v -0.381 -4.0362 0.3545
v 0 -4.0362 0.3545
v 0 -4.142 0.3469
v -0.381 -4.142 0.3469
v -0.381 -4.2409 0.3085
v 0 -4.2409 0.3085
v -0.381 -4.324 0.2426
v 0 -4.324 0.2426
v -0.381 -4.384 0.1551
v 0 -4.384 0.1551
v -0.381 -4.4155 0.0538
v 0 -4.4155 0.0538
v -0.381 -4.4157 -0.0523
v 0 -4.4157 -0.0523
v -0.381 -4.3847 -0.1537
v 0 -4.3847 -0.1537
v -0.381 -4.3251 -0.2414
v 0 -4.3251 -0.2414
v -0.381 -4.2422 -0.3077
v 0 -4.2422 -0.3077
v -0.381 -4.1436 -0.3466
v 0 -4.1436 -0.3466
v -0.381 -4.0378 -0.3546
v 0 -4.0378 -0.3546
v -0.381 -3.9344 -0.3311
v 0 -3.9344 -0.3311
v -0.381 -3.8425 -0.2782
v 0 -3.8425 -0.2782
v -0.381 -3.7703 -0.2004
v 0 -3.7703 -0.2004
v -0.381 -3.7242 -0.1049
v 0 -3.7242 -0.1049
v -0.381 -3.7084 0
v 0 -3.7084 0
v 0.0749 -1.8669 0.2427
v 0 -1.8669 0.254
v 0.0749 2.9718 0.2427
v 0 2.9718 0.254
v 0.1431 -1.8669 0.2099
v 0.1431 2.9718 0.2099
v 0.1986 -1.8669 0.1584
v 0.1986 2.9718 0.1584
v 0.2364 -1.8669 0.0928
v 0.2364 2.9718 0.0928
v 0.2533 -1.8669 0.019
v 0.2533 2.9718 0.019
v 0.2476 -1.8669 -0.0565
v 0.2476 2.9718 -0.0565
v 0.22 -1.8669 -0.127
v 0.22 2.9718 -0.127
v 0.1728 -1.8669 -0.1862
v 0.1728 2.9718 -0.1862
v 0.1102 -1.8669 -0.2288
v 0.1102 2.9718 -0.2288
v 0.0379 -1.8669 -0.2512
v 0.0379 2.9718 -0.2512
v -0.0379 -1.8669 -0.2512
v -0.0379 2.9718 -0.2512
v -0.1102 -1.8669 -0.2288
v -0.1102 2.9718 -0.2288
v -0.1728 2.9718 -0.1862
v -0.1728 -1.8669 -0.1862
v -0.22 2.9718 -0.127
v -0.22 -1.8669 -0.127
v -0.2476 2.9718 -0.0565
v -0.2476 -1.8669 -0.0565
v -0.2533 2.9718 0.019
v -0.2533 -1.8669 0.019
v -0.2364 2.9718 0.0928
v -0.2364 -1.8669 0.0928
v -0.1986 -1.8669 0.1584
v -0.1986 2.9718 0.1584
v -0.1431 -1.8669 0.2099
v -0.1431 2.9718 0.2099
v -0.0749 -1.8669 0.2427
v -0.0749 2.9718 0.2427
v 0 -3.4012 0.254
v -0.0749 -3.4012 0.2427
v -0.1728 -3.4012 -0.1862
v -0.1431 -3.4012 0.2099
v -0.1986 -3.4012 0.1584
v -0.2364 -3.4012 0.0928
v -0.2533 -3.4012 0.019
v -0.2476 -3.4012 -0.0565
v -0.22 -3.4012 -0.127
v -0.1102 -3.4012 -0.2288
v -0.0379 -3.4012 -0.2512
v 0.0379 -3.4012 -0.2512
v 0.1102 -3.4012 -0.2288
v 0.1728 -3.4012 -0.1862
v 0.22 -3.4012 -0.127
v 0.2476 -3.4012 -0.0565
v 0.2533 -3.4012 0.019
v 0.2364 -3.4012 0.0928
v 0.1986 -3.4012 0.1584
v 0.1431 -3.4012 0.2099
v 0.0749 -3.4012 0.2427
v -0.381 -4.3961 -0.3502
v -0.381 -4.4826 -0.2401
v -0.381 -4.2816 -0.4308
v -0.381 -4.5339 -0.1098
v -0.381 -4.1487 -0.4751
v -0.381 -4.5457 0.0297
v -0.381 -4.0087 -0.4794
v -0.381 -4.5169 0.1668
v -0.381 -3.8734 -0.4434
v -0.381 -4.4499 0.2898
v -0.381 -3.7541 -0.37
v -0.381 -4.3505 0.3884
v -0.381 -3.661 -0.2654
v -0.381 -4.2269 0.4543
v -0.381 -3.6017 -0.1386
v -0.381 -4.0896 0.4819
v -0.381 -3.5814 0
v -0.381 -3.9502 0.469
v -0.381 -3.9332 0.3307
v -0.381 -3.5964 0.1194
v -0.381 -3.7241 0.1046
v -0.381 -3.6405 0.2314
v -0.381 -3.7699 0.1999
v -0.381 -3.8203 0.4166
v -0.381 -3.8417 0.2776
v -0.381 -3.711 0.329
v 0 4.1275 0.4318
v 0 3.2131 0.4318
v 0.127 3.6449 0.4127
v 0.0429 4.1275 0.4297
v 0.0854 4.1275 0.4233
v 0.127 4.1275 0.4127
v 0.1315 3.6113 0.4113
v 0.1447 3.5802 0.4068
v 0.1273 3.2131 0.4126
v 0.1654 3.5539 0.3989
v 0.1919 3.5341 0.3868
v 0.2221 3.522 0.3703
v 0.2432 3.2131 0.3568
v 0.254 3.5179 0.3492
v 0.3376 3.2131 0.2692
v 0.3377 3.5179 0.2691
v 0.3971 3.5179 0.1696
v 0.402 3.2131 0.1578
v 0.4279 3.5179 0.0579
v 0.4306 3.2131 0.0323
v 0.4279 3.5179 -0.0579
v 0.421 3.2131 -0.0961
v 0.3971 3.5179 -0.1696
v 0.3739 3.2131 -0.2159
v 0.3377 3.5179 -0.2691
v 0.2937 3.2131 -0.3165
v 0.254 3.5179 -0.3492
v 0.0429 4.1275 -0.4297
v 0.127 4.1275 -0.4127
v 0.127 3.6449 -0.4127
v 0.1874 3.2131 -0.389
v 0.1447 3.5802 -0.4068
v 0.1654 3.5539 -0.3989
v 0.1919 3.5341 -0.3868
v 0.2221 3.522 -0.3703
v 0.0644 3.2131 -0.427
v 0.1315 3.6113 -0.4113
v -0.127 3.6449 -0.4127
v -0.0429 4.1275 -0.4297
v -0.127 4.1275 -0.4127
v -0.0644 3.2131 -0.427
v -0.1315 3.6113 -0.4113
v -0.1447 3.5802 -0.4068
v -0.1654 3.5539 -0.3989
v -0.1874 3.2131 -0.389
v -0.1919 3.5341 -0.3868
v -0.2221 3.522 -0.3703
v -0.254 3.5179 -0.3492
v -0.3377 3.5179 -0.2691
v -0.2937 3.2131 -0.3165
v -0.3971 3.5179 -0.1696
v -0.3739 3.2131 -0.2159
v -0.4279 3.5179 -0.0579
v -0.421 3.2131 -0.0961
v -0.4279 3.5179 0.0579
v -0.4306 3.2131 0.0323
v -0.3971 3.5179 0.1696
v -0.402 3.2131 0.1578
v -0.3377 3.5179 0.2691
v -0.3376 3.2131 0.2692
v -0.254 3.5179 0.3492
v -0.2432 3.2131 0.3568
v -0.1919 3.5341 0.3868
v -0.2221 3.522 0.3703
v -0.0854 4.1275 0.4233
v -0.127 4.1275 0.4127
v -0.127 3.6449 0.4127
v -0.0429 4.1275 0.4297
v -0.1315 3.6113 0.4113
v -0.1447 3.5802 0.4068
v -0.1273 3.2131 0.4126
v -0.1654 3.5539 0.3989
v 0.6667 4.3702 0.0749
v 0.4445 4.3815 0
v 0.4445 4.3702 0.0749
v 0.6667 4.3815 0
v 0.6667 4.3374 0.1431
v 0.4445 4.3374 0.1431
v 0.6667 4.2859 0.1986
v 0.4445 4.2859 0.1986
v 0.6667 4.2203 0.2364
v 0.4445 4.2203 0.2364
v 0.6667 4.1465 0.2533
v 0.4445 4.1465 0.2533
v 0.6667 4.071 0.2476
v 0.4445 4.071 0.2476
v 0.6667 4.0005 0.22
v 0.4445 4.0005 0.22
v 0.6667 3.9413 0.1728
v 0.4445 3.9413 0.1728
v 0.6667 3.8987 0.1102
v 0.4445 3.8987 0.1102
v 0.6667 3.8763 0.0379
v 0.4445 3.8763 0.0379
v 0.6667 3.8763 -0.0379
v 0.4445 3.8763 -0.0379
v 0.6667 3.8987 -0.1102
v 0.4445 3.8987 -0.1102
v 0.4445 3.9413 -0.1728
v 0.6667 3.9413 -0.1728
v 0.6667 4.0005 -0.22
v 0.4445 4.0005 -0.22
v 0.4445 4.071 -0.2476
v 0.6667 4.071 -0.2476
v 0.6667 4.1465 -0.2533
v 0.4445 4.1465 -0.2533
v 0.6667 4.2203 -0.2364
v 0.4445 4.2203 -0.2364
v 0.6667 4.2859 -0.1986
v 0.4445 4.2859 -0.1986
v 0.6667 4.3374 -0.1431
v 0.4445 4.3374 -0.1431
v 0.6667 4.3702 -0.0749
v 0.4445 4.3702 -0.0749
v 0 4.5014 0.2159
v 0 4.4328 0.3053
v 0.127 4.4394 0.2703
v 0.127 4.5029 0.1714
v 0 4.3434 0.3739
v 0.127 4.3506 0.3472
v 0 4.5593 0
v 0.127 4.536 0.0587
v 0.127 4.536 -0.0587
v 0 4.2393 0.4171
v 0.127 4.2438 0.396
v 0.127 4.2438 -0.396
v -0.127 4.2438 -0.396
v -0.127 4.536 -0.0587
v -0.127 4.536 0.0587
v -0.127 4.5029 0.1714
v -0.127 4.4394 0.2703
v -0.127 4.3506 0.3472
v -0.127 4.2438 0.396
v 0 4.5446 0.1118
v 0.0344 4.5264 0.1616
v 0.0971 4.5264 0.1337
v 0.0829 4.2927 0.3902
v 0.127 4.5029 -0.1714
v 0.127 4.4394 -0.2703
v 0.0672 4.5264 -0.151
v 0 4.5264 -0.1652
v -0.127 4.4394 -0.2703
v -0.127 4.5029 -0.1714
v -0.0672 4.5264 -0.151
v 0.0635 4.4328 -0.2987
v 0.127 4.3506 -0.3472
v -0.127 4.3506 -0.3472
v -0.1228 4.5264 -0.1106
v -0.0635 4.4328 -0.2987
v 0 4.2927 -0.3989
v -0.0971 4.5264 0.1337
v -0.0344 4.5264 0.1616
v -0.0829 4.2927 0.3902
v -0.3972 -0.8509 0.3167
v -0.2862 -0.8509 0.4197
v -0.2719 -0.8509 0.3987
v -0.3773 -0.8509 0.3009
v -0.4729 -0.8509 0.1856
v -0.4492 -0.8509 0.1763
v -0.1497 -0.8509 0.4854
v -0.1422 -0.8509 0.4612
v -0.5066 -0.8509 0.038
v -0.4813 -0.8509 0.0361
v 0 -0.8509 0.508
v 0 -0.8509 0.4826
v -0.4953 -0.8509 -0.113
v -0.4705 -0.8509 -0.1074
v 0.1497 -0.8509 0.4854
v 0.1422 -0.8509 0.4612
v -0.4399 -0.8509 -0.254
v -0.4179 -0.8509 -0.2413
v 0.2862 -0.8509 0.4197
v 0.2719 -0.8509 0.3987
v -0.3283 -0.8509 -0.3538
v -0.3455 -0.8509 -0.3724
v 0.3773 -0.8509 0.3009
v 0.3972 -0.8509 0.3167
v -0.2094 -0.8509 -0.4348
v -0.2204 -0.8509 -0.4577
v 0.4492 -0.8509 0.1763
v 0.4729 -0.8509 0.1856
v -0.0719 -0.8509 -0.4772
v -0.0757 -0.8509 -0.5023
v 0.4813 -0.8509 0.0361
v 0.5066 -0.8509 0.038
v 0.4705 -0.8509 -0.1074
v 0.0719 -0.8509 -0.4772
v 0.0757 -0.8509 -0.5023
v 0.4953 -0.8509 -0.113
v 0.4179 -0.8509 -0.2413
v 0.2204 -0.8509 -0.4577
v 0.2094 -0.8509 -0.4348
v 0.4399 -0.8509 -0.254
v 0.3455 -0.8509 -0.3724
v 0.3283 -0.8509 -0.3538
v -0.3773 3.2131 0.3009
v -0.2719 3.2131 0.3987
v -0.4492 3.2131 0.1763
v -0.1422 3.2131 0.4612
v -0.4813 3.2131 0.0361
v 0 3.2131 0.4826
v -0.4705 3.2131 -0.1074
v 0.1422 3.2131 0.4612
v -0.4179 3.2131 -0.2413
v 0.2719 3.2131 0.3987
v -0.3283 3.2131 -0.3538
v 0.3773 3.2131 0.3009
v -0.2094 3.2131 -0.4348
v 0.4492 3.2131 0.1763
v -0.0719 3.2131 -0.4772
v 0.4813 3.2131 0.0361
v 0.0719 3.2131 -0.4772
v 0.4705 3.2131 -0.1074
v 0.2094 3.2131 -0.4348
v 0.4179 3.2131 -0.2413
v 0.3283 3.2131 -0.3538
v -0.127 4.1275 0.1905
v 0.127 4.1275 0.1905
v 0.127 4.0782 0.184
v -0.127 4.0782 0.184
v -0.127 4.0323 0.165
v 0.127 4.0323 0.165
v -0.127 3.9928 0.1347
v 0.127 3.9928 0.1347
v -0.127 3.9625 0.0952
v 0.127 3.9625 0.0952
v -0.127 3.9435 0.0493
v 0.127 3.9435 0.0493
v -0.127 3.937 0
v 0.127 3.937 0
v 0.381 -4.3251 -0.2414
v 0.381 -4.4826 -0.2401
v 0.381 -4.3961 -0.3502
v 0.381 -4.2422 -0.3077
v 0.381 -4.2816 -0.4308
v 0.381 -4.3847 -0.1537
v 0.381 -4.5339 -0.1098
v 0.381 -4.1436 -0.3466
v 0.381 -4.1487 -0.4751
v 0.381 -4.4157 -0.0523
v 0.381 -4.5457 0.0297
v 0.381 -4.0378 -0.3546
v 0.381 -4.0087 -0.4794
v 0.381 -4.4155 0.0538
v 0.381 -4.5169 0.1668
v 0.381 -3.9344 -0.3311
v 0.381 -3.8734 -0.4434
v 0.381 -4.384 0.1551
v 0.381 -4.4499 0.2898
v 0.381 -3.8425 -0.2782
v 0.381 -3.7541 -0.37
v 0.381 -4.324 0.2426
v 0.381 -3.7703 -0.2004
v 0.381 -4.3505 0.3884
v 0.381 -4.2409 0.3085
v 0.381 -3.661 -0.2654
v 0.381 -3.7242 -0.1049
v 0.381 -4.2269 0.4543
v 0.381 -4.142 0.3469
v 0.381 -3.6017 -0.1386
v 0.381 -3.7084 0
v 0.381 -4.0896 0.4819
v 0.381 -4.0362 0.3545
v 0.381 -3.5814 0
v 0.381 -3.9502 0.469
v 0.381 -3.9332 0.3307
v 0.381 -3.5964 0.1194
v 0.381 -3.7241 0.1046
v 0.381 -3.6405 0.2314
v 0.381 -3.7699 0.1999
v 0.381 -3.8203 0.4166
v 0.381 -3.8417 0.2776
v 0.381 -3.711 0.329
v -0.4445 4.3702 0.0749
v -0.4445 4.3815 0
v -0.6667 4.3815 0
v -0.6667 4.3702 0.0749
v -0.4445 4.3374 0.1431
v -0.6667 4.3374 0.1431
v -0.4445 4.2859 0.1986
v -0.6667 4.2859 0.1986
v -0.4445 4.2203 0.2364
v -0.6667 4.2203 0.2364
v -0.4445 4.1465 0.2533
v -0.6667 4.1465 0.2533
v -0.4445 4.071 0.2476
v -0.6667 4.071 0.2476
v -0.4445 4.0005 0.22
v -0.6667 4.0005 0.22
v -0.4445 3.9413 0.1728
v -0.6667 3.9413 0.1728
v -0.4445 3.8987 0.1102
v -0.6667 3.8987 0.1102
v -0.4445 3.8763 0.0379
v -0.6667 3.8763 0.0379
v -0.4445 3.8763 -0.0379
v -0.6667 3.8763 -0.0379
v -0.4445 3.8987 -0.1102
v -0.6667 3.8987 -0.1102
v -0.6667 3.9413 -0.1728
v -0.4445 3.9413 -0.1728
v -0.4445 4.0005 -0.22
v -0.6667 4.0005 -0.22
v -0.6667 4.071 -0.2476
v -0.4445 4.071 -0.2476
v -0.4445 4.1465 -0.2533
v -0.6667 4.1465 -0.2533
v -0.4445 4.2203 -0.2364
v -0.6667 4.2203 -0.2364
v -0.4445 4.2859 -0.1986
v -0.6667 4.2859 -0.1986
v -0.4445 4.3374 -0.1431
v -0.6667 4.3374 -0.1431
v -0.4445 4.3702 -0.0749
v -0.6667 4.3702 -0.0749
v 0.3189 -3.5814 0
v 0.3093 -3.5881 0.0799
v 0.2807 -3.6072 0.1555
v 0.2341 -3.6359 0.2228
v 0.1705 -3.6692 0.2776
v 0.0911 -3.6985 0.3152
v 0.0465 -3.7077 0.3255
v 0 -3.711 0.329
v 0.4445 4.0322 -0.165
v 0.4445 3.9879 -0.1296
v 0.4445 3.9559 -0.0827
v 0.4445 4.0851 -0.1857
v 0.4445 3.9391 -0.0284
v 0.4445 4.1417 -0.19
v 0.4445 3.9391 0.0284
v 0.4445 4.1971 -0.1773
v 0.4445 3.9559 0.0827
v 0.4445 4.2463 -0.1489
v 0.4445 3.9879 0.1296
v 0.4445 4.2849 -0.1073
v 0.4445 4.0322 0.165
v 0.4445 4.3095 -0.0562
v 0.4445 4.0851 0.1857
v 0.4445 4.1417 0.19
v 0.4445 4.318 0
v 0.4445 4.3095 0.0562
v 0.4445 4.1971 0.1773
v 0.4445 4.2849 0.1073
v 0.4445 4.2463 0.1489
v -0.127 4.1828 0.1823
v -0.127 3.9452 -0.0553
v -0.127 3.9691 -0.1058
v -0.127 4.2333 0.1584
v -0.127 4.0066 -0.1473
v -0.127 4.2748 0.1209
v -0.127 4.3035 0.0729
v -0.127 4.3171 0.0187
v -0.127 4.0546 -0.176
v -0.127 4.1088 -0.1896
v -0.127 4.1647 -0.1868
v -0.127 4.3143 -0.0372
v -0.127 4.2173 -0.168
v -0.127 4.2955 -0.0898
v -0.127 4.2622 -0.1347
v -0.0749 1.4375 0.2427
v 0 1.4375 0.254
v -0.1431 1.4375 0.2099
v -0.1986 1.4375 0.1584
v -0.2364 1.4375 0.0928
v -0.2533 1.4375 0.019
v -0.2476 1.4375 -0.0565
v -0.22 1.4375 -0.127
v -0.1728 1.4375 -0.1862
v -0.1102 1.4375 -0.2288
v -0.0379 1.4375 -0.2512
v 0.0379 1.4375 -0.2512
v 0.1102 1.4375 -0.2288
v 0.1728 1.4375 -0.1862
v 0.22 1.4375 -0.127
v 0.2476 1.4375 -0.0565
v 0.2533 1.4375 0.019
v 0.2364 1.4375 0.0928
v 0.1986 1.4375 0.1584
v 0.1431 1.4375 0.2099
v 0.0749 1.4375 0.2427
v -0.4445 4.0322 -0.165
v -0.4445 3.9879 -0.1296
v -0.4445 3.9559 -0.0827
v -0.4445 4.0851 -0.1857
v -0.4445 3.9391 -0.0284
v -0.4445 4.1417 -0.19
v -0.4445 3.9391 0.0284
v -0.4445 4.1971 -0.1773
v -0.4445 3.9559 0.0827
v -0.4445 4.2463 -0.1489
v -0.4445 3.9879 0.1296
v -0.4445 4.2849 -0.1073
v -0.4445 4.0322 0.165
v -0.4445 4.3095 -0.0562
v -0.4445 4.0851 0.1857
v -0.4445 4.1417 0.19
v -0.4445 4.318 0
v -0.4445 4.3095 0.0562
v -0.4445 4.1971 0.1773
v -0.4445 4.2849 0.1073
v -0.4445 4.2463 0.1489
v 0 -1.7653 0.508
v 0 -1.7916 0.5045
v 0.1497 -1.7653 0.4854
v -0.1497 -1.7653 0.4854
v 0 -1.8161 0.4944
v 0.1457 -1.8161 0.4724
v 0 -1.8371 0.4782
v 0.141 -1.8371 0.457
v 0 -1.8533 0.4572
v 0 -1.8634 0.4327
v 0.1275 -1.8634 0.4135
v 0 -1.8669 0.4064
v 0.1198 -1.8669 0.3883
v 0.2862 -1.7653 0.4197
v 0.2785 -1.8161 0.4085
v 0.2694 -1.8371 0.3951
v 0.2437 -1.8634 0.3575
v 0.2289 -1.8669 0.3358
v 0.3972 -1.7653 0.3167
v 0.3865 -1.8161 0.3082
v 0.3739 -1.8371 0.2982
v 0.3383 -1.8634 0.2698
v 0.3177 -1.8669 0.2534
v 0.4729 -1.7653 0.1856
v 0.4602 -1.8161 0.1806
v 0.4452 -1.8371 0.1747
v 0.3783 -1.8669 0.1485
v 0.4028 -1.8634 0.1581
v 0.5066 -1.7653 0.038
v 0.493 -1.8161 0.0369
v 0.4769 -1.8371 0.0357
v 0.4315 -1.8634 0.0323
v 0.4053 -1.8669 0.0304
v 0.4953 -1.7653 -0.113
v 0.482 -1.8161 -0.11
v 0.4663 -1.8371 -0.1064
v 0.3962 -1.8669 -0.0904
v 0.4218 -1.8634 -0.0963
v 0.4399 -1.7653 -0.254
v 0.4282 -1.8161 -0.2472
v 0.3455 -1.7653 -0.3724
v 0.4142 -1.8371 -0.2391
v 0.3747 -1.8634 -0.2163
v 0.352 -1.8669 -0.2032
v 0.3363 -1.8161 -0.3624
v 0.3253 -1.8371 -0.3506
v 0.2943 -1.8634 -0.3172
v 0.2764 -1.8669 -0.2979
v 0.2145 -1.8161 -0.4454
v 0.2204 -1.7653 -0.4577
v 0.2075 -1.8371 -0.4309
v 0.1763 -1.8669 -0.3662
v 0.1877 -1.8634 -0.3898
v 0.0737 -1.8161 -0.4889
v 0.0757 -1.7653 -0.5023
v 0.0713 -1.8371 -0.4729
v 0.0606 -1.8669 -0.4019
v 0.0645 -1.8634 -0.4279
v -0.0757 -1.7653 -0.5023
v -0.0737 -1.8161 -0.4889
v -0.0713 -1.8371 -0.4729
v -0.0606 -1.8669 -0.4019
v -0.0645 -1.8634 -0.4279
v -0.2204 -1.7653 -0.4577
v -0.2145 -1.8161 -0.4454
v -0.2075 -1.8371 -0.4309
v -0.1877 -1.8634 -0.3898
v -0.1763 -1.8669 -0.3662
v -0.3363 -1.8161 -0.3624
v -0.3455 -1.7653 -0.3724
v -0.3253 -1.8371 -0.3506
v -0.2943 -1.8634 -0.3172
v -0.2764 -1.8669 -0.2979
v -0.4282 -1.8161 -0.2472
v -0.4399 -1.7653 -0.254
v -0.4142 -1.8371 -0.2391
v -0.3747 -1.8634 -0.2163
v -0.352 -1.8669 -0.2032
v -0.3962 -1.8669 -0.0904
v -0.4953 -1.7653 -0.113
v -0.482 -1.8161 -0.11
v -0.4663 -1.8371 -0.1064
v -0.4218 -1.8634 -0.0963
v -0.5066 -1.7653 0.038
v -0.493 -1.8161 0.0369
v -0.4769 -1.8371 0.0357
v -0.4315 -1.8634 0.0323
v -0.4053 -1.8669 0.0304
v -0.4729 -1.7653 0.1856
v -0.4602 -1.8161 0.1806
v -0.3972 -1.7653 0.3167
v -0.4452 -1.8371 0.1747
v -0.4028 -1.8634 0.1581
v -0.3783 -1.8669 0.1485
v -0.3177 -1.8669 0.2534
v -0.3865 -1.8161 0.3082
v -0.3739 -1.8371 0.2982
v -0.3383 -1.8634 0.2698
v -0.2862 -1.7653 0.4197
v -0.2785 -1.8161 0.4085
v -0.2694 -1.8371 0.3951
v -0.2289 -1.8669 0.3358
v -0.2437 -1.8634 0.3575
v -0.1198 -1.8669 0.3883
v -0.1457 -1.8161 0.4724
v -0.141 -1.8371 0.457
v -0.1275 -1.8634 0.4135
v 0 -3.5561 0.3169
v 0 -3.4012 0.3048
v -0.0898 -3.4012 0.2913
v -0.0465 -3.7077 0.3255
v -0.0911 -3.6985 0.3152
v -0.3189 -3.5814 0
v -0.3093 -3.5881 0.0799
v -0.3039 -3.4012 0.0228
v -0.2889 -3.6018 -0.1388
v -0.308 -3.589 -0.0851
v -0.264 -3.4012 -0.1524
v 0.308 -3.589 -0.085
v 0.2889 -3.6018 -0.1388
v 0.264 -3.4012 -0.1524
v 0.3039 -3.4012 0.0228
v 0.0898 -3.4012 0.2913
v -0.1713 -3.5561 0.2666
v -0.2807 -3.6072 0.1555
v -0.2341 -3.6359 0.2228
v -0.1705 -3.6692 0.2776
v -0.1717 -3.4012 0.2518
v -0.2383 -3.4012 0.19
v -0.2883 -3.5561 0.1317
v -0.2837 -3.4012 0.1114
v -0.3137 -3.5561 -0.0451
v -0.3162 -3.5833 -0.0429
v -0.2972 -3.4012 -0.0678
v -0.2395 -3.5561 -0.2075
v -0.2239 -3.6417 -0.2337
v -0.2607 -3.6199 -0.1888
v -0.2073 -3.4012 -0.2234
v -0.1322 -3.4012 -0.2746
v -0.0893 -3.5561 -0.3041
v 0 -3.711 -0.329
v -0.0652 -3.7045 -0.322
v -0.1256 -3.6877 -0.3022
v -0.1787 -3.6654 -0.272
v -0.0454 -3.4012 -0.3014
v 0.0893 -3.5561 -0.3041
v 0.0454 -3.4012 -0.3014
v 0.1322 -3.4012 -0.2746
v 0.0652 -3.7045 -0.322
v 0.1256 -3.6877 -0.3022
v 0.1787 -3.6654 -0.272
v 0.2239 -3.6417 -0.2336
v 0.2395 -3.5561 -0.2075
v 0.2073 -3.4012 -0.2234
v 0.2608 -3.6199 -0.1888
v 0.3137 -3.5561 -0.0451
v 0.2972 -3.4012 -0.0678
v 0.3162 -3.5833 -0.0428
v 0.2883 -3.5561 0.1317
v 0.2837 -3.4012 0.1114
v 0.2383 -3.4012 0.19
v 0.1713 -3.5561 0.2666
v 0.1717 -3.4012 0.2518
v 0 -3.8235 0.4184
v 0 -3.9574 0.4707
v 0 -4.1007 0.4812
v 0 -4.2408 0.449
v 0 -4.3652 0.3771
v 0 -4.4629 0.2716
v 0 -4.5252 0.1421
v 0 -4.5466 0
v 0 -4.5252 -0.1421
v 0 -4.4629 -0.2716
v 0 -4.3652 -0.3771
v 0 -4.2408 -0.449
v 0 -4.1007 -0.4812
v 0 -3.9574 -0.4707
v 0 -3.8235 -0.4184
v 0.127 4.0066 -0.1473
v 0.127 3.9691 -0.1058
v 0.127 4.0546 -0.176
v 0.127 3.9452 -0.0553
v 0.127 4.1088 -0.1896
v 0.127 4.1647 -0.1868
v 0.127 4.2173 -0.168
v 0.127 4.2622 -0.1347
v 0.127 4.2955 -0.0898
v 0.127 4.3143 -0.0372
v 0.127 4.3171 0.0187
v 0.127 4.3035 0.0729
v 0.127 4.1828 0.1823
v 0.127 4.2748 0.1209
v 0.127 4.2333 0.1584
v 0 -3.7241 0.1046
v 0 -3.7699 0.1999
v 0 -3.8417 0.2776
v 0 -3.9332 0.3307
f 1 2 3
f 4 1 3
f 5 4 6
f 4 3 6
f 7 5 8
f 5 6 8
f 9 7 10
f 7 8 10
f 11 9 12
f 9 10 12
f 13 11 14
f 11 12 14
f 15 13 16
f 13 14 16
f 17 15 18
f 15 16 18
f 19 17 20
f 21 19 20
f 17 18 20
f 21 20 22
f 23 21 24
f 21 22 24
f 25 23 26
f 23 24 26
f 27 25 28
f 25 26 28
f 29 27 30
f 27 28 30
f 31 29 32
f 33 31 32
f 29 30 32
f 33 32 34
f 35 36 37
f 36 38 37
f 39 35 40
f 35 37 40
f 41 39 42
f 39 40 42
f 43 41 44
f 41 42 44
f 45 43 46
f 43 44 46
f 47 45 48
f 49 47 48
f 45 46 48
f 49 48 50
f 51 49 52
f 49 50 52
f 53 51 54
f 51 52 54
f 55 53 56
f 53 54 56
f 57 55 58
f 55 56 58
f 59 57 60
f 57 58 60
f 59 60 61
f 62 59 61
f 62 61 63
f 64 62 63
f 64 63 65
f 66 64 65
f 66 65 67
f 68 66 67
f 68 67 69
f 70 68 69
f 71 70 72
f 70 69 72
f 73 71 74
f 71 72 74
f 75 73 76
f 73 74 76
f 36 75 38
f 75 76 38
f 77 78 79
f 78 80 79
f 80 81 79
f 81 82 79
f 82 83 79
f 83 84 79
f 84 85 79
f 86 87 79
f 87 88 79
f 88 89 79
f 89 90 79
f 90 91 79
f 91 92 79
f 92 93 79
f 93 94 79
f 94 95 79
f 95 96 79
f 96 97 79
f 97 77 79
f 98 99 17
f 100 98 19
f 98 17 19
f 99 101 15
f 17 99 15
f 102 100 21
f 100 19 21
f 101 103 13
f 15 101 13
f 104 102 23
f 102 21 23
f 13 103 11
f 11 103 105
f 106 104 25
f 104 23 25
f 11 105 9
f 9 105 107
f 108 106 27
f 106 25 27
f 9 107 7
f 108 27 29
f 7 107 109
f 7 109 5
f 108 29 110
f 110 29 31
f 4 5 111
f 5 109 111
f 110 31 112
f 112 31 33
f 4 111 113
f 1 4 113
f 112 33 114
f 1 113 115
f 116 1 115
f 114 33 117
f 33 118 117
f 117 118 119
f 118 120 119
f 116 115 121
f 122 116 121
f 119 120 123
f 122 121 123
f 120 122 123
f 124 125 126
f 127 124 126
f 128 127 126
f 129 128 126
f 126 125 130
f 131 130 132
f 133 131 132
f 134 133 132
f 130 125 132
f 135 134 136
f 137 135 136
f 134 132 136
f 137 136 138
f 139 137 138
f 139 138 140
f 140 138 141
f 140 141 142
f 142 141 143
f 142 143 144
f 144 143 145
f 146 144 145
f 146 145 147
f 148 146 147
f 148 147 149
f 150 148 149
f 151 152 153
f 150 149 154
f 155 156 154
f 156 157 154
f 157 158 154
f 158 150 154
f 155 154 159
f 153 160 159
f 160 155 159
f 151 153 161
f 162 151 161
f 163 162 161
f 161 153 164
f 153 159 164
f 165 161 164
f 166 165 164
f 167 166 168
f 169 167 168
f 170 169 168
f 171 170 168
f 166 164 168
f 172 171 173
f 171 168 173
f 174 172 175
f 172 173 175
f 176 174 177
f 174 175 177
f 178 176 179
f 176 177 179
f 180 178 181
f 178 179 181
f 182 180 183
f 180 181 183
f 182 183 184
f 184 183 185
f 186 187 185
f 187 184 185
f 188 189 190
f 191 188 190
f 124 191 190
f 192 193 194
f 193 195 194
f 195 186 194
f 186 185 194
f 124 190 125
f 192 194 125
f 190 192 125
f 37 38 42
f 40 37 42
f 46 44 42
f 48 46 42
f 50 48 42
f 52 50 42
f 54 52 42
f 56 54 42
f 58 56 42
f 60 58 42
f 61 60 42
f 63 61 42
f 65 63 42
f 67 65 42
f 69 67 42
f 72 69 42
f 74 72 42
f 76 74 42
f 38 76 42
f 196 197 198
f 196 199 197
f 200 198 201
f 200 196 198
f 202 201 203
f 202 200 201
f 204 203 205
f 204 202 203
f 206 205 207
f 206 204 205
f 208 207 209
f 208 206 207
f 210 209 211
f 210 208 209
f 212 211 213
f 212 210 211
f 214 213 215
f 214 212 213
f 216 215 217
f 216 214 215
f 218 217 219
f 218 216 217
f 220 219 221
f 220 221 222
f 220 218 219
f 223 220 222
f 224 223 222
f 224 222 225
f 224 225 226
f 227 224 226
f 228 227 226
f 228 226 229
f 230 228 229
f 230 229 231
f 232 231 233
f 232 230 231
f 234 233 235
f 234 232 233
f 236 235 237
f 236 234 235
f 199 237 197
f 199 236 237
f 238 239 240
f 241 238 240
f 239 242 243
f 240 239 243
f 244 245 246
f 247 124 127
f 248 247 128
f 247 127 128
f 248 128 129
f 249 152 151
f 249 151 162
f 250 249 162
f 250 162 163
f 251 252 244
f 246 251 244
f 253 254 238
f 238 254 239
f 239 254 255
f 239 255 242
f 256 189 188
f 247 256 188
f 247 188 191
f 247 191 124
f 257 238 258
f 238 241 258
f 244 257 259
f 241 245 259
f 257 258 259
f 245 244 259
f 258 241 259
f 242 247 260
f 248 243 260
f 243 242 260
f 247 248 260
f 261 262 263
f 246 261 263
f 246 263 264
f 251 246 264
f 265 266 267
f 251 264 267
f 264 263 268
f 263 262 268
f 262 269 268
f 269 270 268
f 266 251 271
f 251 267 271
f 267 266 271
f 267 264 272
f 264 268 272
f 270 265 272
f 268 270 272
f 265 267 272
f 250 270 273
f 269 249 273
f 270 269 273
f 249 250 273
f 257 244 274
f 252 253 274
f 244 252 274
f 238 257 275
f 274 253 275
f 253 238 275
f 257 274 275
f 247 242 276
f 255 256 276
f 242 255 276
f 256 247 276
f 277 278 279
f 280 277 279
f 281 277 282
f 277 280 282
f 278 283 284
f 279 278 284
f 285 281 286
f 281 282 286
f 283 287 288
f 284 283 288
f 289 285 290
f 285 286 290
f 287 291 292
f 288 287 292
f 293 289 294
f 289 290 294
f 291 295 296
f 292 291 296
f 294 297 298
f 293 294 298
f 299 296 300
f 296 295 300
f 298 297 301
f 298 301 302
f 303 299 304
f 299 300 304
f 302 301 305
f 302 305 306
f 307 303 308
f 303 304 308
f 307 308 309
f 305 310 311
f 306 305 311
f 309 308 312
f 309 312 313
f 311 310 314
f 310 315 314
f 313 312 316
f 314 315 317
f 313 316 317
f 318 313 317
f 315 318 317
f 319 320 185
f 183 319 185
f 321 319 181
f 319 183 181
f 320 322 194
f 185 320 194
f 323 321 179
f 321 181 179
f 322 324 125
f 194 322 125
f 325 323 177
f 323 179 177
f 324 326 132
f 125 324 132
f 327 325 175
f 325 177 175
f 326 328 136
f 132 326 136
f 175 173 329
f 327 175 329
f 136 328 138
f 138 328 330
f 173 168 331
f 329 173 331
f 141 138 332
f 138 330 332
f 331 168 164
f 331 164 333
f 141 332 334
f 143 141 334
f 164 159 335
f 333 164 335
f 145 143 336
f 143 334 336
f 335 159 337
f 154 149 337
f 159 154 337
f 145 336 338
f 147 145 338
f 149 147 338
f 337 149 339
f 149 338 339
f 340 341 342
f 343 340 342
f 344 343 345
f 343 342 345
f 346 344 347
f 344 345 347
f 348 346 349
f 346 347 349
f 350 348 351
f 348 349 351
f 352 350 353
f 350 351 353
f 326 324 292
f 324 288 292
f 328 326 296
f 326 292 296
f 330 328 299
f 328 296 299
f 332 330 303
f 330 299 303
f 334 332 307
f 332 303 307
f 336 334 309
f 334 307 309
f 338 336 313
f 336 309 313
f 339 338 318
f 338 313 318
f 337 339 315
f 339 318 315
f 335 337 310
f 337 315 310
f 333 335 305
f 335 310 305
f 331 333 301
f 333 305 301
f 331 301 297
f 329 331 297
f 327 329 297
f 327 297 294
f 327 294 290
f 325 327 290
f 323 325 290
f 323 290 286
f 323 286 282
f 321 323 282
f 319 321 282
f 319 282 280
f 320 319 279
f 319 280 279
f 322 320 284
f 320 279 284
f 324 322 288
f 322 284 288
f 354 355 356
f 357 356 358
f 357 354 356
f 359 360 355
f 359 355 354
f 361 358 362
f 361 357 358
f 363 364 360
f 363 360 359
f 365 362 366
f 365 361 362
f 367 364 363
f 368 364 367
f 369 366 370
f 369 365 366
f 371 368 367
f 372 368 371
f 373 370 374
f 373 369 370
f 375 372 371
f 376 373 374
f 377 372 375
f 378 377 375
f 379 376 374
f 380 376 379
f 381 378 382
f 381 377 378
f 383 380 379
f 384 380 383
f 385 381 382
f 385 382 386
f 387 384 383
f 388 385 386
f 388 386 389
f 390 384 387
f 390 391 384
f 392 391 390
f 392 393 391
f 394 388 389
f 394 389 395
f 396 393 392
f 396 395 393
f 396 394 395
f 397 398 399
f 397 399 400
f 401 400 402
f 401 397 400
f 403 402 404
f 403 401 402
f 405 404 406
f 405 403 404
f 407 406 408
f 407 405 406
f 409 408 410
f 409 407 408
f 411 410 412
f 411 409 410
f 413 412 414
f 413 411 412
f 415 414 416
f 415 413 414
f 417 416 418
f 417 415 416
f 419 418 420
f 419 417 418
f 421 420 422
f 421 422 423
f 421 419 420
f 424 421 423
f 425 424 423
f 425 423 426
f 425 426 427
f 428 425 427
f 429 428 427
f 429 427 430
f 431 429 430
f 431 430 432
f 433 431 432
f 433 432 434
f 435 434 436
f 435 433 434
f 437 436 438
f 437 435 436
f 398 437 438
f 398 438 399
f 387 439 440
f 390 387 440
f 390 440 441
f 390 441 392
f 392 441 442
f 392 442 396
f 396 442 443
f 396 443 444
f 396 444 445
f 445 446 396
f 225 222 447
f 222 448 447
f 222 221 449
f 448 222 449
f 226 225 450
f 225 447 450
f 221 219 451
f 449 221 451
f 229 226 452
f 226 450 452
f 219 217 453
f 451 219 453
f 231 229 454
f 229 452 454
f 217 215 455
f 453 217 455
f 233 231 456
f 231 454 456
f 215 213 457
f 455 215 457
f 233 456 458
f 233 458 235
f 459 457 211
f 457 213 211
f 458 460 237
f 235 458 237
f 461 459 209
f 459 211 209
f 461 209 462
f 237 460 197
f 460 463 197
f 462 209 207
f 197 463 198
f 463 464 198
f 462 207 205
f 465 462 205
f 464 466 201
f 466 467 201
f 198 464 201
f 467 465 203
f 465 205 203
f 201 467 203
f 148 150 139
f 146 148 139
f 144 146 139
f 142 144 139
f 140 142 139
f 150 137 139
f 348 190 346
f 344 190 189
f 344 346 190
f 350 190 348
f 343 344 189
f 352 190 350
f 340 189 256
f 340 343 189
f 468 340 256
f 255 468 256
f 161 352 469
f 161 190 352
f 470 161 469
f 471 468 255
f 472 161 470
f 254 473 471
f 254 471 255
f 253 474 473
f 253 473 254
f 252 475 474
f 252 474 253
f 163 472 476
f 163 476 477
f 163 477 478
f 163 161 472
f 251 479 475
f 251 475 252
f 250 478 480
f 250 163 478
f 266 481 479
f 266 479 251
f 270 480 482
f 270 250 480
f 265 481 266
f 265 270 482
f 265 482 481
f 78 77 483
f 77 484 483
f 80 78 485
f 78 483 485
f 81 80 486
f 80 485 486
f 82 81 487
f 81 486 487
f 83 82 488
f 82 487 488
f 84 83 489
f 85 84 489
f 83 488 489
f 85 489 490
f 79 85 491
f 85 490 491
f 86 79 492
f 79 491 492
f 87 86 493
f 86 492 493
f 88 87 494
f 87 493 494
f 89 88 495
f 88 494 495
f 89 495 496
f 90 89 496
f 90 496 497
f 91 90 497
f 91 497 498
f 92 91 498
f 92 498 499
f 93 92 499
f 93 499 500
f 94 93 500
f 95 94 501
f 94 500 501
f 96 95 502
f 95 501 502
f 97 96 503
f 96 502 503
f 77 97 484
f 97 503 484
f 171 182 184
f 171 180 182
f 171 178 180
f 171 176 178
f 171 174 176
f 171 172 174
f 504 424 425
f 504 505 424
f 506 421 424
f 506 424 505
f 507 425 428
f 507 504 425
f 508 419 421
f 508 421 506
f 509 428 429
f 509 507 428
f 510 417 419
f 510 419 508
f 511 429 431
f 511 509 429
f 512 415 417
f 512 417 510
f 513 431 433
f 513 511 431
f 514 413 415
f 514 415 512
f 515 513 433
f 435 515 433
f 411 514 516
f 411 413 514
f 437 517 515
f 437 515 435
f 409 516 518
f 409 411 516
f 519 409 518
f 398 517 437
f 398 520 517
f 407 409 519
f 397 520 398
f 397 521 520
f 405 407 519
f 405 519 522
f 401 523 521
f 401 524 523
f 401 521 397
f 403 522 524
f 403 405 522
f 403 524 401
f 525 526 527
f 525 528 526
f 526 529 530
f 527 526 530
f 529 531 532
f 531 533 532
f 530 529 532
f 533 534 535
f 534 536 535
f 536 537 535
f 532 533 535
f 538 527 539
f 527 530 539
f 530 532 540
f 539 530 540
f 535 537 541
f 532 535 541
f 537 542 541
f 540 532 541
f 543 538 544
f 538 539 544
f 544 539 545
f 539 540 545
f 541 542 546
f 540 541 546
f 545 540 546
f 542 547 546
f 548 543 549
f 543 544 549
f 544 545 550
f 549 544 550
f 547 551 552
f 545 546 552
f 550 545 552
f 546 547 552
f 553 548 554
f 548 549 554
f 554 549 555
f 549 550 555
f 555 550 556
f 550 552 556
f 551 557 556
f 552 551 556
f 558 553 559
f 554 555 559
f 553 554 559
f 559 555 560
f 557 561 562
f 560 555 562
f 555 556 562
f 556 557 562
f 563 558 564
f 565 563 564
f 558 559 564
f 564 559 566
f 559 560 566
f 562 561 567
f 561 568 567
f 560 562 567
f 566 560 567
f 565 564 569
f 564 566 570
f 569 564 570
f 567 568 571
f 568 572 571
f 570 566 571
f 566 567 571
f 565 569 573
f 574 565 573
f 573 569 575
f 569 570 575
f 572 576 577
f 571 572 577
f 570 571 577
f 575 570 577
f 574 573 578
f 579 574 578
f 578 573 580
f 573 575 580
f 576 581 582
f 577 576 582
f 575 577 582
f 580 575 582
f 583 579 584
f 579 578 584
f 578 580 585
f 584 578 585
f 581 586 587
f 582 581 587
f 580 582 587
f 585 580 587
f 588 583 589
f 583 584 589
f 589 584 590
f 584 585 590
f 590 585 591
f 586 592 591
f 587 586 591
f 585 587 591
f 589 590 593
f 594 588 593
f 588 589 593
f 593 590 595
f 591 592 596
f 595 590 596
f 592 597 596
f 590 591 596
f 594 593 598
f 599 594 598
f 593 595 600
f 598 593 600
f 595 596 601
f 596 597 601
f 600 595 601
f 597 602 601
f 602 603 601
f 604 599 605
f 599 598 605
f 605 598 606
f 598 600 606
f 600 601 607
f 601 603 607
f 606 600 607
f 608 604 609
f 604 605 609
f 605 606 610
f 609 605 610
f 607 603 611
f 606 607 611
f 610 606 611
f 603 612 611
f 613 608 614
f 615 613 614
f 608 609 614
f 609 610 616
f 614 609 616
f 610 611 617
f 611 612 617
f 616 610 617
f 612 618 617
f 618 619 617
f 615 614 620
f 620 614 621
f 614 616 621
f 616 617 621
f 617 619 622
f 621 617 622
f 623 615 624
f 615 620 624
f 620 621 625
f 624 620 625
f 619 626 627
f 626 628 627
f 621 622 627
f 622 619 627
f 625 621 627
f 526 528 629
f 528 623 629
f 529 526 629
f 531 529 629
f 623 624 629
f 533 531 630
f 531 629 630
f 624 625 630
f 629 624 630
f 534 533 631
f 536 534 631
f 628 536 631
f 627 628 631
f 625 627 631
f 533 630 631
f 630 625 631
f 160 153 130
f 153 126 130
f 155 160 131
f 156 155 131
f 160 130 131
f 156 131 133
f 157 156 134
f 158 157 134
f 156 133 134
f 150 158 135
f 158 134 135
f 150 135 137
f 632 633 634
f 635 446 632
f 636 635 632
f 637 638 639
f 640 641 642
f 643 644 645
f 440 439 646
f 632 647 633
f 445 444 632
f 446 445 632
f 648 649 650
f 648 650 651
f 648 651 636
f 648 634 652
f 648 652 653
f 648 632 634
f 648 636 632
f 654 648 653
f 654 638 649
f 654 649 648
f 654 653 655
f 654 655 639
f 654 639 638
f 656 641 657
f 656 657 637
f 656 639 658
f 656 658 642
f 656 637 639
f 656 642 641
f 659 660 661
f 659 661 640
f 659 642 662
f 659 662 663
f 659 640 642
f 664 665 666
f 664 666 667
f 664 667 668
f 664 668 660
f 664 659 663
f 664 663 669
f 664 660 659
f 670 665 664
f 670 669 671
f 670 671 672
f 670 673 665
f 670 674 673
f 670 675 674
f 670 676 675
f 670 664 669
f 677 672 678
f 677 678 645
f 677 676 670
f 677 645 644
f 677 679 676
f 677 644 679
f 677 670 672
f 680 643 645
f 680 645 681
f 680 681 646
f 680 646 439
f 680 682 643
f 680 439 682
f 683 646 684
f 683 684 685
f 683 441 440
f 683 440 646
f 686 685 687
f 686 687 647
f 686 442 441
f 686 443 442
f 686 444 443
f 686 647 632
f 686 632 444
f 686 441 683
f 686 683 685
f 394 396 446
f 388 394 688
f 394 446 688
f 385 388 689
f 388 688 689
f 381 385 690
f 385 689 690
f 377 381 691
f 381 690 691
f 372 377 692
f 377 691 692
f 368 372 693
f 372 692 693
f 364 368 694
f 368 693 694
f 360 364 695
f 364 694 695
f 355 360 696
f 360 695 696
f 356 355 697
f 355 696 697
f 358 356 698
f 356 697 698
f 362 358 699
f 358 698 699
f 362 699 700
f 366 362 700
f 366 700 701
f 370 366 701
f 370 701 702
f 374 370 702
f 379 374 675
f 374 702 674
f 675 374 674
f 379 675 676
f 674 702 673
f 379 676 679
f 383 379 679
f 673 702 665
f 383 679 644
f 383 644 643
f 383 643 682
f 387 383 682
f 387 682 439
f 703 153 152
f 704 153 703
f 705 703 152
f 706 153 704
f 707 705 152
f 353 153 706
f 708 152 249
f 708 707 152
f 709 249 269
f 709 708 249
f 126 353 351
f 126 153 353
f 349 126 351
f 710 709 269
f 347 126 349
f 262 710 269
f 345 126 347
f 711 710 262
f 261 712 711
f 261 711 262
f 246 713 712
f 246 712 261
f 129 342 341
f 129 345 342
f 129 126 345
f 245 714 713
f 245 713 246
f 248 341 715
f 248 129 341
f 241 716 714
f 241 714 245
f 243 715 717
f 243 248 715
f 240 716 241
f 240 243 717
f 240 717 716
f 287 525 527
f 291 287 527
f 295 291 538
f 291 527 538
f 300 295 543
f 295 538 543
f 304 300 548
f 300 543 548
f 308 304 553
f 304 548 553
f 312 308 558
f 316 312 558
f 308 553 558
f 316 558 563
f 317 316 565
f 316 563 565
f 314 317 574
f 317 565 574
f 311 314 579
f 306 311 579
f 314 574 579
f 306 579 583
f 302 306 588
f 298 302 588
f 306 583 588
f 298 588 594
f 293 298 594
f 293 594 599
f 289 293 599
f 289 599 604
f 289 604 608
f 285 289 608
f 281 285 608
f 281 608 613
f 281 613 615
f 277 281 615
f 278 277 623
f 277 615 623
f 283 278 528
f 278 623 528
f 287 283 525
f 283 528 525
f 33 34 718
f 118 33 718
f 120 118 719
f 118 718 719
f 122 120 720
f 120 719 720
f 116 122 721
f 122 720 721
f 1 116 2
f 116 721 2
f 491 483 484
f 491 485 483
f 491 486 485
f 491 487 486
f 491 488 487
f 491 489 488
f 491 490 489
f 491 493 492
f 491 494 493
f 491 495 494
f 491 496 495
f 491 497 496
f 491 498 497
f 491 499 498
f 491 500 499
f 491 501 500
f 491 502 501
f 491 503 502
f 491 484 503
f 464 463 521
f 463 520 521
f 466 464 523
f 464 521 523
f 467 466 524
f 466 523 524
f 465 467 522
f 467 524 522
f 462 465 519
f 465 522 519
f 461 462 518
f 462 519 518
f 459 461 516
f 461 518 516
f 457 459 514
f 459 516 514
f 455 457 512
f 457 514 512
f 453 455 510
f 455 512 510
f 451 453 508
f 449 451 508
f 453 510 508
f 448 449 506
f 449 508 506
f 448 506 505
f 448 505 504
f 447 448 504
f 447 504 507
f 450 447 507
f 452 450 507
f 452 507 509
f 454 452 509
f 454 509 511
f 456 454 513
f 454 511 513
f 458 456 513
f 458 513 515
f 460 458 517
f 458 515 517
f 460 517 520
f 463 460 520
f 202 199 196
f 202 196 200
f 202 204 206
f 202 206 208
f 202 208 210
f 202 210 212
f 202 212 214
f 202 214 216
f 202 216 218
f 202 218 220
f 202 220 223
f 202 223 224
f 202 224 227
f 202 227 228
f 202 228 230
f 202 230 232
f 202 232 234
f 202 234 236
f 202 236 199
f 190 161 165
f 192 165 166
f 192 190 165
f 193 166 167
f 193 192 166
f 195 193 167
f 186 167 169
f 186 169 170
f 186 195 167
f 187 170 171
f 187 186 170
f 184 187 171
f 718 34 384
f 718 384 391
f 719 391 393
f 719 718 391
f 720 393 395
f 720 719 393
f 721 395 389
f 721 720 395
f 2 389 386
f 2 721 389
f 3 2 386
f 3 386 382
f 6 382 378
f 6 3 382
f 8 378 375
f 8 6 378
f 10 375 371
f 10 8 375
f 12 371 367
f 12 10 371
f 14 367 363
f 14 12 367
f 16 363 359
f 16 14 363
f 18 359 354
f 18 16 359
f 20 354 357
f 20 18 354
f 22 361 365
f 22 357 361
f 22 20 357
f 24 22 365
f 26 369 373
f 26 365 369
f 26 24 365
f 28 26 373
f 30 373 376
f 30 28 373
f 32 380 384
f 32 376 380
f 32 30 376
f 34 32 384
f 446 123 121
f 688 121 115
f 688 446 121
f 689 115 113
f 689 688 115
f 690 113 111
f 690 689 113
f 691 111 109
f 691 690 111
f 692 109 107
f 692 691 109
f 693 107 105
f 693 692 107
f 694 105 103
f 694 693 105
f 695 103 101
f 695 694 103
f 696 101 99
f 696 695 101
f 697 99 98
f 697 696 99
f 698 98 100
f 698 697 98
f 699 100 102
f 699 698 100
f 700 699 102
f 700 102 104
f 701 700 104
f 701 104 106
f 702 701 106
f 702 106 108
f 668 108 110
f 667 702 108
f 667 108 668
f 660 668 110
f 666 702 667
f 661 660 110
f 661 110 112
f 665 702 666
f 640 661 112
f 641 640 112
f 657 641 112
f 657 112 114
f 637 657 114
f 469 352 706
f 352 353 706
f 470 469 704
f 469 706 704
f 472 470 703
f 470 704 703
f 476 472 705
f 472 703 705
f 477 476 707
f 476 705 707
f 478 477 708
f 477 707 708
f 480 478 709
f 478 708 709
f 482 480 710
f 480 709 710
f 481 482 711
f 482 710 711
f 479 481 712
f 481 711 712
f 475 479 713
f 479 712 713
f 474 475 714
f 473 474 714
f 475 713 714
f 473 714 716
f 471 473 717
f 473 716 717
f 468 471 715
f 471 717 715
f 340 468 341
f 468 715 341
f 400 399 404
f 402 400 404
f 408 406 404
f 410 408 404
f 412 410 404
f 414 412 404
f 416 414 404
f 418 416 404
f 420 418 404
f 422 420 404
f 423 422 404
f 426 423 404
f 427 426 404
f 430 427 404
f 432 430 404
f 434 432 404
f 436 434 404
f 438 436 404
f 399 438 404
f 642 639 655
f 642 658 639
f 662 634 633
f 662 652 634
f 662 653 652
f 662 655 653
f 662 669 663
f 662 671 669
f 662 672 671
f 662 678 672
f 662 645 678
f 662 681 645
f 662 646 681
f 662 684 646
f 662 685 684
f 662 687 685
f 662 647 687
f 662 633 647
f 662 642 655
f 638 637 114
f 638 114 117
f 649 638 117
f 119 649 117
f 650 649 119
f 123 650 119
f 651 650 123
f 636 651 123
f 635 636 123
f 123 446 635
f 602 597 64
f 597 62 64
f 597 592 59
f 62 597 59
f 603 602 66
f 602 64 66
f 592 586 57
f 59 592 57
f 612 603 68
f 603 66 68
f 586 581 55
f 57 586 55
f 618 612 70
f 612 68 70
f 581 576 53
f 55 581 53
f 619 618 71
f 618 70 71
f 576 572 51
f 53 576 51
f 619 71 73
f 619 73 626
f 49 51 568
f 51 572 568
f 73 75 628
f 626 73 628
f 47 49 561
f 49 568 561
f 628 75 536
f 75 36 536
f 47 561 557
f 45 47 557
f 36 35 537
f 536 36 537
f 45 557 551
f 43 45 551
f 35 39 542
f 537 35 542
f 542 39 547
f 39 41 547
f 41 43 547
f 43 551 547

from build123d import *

# Parameters (mm, degrees)
F2_R      = 0.1016
F3_W      = 0.508
F3_H      = 1.27
F4_DEPTH  = 1.27
F5_R      = 0.127
F6_DEPTH  = 12.7
F8_DEPTH  = 0.381
F10_DEPTH = 12.7
F7_W      = 4.8387
F7_H      = 0.254
F12_R     = 0.254
F12_R_2   = 0.1905
F13_DEPTH = 0.66675
F14_DEPTH = 0.4445


with BuildPart() as f1:
    # F0 (on Right) → F1 (revolve)
    with BuildSketch(Plane.YZ):
        Polygon((2.9718, 0), (3.2131, 0), (3.2131, 0.4318), (3.2131, 0.4826), (-0.8509, 0.4826), (-0.8509, 0.508), (-1.8669, 0.508), (-1.8669, 0.254), (2.9718, 0.254), align=None)
        with BuildLine():
            Line((3.2131, 0.4318), (3.2131, 0))
            Line((3.2131, 0), (3.937, 0))
            ThreePointArc((3.937, 0), (3.9927961582, 0.1347038418), (4.1275, 0.1905))
            Line((4.1275, 0.1905), (4.1275, 0.4318))
            Line((4.1275, 0.4318), (3.2131, 0.4318))
        make_face()
        with BuildLine():
            ThreePointArc((4.1275, 0.1905), (3.9927961582, 0.1347038418), (3.937, 0))
            Line((3.937, 0), (4.1275, 0))
            Line((4.1275, 0), (4.1275, 0.1905))
        make_face()
        with BuildLine():
            Line((4.1275, 0.1905), (4.1275, 0))
            Line((4.1275, 0), (4.318, 0))
            ThreePointArc((4.318, 0), (4.2622038418, 0.1347038418), (4.1275, 0.1905))
        make_face()
        with BuildLine():
            ThreePointArc((4.5593, 0), (4.4328287081, 0.3053287081), (4.1275, 0.4318))
            Line((4.1275, 0.4318), (4.1275, 0.1905))
            ThreePointArc((4.1275, 0.1905), (4.2622038418, 0.1347038418), (4.318, 0))
            Line((4.318, 0), (4.5593, 0))
        make_face()
    revolve(axis=Axis((0, 3.09245, 0), (0, 1, 0)))

    # F2
    f2_edges = [f1.edges().sort_by_distance(p)[0] for p in [
        (0, -1.8669, -0.508),
    ]]
    fillet(f2_edges, radius=F2_R)

    # F3 (on Top) → F4 (cut, symmetric)
    with BuildSketch(Plane.XY):
        with Locations((-0.381, 4.1529)):
            Rectangle(F3_W, F3_H)
        with Locations((0.381, 4.1529)):
            Rectangle(F3_W, F3_H)
    extrude(amount=F4_DEPTH, both=True, mode=Mode.SUBTRACT)

    # F5
    f5_edges = [f1.edges().sort_by_distance(p)[0] for p in [
        (-0.127, 3.5179, 0),
        (0.127, 3.5179, 0),
    ]]
    fillet(f5_edges, radius=F5_R)

    # F0 (on Right) → F6 (cut, symmetric)
    with BuildSketch(Plane.YZ):
        with BuildLine():
            Line((4.1275, 0.1905), (4.1275, 0))
            Line((4.1275, 0), (4.318, 0))
            ThreePointArc((4.318, 0), (4.2622038418, 0.1347038418), (4.1275, 0.1905))
        make_face()
        with BuildLine():
            ThreePointArc((4.1275, 0.1905), (3.9927961582, 0.1347038418), (3.937, 0))
            Line((3.937, 0), (4.1275, 0))
            Line((4.1275, 0), (4.1275, 0.1905))
        make_face()
        with BuildLine():
            Line((4.1275, 0), (3.937, 0))
            ThreePointArc((3.937, 0), (4.1275, -0.1905), (4.318, 0))
            Line((4.318, 0), (4.1275, 0))
        make_face()
    extrude(amount=F6_DEPTH, both=True, mode=Mode.SUBTRACT)


with BuildPart() as f8:
    # F7 (on Right) → F8 (new body, symmetric)
    with BuildSketch(Plane.YZ):
        with BuildLine():
            ThreePointArc((-4.0362444524, 0.3545151472), (-4.3250758824, -0.2414347606), (-3.7084, 0))
            ThreePointArc((-3.7084, 0), (-3.8029241176, 0.2414347606), (-4.0362444524, 0.3545151472))
        make_face()
        with BuildLine():
            Line((-3.7084, 0), (-3.5814, 0))
            ThreePointArc((-3.5814, 0), (-3.6149595808, 0.1768204227), (-3.7109709154, 0.3290489712))
            Line((-3.7109709154, 0.3290489712), (-4.0362444524, 0.3545151472))
            ThreePointArc((-4.0362444524, 0.3545151472), (-3.8029241176, 0.2414347606), (-3.7084, 0))
        make_face()
        with BuildLine():
            ThreePointArc((-3.7109709154, 0.3290489712), (-4.5130404192, -0.1768204227), (-3.5814, 0))
            Line((-3.5814, 0), (-3.7084, 0))
            ThreePointArc((-3.7084, 0), (-4.3250758824, -0.2414347606), (-4.0362444524, 0.3545151472))
            Line((-4.0362444524, 0.3545151472), (-3.7109709154, 0.3290489712))
        make_face()
    extrude(amount=F8_DEPTH, both=True)

    # F7 (on Right) → F9 (revolve)
    with BuildSketch(Plane.YZ):
        with BuildLine():
            ThreePointArc((-3.7109709154, 0.3290489712), (-3.6149595808, 0.1768204227), (-3.5814, 0))
            Line((-3.5814, 0), (-3.4012444524, 0))
            Line((-3.4012444524, 0), (-3.4012444524, 0.254))
            Line((-3.4012444524, 0.254), (-3.4012444524, 0.3048))
            Line((-3.4012444524, 0.3048), (-3.7109709154, 0.3290489712))
        make_face()
        with BuildLine():
            Line((-3.7084, 0), (-3.5814, 0))
            ThreePointArc((-3.5814, 0), (-3.6149595808, 0.1768204227), (-3.7109709154, 0.3290489712))
            Line((-3.7109709154, 0.3290489712), (-4.0362444524, 0.3545151472))
            ThreePointArc((-4.0362444524, 0.3545151472), (-3.8029241176, 0.2414347606), (-3.7084, 0))
        make_face()
    revolve(axis=Axis((0, -3.5548222262, 0), (0, -1, 0)))

    # F7 (on Right) → F10 (cut, symmetric)
    with BuildSketch(Plane.YZ):
        with BuildLine():
            ThreePointArc((-4.0362444524, 0.3545151472), (-4.3250758824, -0.2414347606), (-3.7084, 0))
            ThreePointArc((-3.7084, 0), (-3.8029241176, 0.2414347606), (-4.0362444524, 0.3545151472))
        make_face()
    extrude(amount=F10_DEPTH, both=True, mode=Mode.SUBTRACT)


with BuildPart() as f11:
    # F7 (on Right) → F11 (revolve)
    with BuildSketch(Plane.YZ):
        with Locations((-0.9818944524, 0.127)):
            Rectangle(F7_W, F7_H)
    revolve(axis=Axis((0, -0.9818944524, 0), (0, -1, 0)))


with BuildPart() as f13:
    # F12 (on Right) → F13 (new body, symmetric)
    with BuildSketch(Plane.YZ):
        with Locations((4.1275, 0)):
            Circle(F12_R)
        with Locations((4.1275, 0)):
            Circle(F12_R_2, mode=Mode.SUBTRACT)
        with Locations((4.1275, 0)):
            Circle(F12_R_2)
    extrude(amount=F13_DEPTH, both=True)

    # F12 (on Right) → F14 (cut, symmetric)
    with BuildSketch(Plane.YZ):
        with Locations((4.1275, 0)):
            Circle(F12_R)
        with Locations((4.1275, 0)):
            Circle(F12_R_2, mode=Mode.SUBTRACT)
    extrude(amount=F14_DEPTH, both=True, mode=Mode.SUBTRACT)


solid = Compound([f1.part, f8.part, f11.part, f13.part])
